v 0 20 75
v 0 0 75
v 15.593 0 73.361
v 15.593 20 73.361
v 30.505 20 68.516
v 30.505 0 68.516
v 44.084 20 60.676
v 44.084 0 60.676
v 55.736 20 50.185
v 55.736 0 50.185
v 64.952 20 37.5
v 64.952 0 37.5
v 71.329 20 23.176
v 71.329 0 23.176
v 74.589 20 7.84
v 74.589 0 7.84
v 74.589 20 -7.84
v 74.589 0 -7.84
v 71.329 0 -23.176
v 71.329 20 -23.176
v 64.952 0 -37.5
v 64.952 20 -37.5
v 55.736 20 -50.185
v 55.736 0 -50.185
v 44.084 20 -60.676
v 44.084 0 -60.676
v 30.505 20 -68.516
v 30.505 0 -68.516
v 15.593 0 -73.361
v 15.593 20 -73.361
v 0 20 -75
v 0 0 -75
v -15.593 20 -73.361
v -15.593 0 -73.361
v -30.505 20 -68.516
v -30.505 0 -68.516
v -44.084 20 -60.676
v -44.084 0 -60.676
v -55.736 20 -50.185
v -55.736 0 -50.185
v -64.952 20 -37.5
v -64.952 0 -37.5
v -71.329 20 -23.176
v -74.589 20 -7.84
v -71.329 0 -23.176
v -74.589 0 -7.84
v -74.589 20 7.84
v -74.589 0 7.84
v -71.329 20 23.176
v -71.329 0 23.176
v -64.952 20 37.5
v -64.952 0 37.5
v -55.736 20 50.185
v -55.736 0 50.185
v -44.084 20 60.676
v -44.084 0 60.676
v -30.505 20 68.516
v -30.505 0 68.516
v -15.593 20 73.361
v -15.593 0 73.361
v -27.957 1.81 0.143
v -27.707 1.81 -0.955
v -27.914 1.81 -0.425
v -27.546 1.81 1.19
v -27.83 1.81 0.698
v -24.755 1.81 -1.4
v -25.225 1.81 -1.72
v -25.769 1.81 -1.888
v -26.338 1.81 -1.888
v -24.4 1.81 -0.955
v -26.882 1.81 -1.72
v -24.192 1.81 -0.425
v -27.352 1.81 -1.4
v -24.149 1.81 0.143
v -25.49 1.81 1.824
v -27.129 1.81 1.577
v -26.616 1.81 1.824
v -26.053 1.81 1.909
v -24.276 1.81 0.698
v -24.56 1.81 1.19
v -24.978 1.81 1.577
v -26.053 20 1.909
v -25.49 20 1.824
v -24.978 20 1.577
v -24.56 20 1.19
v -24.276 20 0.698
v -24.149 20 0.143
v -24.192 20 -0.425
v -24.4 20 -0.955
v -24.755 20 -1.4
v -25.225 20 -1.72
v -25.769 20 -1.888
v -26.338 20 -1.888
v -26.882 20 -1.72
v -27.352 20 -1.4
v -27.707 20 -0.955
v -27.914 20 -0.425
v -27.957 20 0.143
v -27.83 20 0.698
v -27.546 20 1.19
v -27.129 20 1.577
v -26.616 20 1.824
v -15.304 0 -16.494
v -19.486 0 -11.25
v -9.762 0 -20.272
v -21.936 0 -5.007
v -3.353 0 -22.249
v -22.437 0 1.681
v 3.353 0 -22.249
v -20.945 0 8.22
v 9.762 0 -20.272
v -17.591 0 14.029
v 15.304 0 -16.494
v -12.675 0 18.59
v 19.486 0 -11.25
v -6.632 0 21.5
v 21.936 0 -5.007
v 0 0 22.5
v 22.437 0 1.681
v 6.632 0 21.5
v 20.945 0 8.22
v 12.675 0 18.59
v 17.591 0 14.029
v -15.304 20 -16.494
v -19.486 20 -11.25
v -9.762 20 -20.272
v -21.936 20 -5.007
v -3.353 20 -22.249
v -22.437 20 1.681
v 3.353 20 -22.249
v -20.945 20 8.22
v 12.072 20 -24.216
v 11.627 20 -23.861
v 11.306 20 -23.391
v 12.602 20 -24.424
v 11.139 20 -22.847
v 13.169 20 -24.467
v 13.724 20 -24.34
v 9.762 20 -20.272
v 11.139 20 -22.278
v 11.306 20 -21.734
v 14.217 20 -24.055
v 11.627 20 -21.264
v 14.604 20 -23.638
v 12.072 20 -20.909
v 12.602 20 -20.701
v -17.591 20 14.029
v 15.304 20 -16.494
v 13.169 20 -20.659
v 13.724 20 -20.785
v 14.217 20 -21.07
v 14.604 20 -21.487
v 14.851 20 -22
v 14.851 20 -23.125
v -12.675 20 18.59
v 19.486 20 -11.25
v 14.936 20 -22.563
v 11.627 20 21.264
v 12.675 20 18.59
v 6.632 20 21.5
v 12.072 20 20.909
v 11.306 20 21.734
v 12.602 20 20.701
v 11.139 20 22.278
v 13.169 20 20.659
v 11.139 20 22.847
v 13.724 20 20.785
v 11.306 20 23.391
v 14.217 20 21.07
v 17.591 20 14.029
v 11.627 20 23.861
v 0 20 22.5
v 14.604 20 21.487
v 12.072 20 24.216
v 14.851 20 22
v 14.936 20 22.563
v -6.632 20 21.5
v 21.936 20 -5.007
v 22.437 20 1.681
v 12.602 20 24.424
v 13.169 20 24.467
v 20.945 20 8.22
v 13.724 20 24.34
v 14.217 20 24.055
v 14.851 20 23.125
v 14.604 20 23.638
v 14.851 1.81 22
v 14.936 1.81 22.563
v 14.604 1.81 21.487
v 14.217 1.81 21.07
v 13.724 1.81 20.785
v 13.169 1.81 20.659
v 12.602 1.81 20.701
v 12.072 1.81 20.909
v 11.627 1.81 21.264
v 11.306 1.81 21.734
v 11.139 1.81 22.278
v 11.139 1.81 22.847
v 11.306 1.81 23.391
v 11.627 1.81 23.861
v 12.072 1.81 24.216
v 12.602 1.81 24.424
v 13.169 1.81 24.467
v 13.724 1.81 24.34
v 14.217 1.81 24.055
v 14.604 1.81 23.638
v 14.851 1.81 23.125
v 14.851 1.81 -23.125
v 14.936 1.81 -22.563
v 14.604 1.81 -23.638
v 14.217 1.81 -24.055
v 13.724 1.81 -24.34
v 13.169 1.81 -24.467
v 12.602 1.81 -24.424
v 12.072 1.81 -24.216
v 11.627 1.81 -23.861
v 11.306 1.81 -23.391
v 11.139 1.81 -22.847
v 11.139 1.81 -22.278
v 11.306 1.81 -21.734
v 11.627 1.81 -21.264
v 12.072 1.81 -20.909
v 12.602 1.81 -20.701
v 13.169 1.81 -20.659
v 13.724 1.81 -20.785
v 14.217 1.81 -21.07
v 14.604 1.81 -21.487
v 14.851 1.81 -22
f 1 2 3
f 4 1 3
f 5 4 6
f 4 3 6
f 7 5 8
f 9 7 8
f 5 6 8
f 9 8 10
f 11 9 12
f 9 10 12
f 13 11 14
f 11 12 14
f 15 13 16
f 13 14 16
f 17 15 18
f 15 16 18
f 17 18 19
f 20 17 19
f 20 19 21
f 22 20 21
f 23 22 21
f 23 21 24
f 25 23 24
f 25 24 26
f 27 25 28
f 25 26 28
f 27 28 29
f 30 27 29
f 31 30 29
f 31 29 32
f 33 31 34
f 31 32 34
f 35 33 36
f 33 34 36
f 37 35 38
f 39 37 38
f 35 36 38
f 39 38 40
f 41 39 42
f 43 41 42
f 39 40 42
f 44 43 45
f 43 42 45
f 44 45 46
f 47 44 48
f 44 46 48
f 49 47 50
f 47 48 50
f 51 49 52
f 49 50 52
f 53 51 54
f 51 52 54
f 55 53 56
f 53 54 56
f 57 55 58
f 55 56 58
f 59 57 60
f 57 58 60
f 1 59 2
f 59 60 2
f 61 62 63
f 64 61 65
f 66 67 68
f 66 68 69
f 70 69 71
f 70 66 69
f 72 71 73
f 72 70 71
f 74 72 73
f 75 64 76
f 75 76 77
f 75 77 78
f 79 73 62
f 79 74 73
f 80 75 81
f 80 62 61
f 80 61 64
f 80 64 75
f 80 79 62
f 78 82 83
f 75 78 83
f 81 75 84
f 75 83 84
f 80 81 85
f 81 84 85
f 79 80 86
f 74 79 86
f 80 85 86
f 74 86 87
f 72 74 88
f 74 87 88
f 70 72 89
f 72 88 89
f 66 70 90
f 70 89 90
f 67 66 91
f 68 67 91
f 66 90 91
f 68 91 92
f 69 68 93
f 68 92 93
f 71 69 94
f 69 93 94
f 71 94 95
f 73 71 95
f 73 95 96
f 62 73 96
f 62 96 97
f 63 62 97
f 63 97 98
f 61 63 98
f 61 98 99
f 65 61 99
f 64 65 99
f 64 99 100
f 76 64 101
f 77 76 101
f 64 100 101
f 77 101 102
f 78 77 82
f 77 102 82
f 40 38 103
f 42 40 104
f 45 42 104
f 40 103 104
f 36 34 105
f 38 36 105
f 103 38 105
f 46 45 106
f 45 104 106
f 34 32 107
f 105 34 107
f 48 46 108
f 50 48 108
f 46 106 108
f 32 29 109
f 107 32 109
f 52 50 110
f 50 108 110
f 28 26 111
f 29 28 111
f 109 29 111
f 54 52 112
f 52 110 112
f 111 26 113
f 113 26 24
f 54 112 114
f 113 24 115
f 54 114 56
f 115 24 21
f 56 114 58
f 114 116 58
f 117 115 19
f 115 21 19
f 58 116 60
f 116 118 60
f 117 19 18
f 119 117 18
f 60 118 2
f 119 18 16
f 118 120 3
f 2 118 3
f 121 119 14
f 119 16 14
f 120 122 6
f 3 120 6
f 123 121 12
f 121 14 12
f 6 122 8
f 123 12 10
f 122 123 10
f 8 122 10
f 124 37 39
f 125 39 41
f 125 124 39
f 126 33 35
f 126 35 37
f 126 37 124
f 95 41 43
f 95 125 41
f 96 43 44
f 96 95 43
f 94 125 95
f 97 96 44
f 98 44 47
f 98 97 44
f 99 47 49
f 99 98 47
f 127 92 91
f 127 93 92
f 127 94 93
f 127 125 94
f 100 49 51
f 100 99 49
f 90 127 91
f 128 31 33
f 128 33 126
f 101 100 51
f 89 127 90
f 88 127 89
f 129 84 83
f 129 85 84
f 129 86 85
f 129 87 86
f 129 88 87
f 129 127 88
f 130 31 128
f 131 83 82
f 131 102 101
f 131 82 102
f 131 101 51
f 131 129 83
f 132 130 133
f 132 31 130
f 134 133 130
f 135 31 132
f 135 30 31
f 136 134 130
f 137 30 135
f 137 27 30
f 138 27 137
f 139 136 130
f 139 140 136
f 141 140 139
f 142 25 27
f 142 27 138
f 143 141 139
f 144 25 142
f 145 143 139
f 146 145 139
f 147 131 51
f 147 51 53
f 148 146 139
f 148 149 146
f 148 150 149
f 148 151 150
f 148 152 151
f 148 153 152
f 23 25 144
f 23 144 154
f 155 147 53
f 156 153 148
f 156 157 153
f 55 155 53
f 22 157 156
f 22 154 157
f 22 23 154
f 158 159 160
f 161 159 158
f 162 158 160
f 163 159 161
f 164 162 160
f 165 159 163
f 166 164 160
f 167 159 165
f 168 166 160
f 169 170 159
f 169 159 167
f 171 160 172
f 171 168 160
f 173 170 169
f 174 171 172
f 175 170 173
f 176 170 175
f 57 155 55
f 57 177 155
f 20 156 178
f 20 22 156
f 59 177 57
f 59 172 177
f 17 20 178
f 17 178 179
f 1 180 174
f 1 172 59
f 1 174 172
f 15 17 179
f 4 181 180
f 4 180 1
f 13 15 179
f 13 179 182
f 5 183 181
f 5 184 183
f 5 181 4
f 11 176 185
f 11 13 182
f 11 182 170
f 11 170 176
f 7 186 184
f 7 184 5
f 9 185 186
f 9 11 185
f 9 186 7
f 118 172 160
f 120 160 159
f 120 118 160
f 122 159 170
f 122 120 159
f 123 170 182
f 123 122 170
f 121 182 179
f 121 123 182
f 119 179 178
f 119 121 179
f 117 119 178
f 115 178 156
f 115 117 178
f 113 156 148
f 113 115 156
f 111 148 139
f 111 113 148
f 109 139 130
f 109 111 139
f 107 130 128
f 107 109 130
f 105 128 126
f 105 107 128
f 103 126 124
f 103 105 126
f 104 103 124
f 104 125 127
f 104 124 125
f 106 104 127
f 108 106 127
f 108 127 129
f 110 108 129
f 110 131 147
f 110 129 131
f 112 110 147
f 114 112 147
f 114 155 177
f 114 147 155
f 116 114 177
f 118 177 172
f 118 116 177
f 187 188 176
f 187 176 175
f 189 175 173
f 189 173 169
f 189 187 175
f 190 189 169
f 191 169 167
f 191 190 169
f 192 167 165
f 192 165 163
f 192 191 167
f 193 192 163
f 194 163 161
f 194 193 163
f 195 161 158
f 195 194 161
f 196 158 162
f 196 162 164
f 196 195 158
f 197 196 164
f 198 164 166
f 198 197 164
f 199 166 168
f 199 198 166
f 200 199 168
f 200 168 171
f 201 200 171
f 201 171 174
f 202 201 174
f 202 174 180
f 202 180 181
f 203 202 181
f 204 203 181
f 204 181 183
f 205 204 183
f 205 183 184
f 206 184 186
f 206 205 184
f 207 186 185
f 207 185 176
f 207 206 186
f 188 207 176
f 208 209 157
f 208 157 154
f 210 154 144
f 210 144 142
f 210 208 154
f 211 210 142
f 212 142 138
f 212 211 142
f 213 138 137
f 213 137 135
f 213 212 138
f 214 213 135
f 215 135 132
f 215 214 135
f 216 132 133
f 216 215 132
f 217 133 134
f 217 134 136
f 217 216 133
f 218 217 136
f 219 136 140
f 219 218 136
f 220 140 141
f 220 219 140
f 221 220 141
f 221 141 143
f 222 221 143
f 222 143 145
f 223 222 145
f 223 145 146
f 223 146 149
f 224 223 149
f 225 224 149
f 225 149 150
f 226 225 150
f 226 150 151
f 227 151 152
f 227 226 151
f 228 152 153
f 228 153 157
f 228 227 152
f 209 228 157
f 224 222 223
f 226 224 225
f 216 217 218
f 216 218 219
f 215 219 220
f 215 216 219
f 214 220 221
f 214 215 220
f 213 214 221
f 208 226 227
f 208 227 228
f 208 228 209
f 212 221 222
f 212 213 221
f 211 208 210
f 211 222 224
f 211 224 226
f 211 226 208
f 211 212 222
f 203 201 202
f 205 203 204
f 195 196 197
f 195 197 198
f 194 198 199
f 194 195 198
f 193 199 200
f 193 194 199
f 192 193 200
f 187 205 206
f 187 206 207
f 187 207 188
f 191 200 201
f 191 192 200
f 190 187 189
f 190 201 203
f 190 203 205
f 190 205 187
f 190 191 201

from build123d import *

# Parameters (mm, degrees)
SKETCH1_R           = 75
BOSS_EXTRUDE1_DEPTH = 20
SKETCH2_R           = 22.5
CUT_EXTRUDE1_DEPTH  = 108.935165725
SKETCH3_R           = 1.909197161
CUT_EXTRUDE2_DEPTH  = 18.190324685
CIRPATTERN1_COUNT   = 3


with BuildPart() as part:
    # Sketch1 → Boss-Extrude1 (new body)
    with BuildSketch(Plane(origin=(0, 0, 0), x_dir=(1, 0, 0), z_dir=(0, 1, 0))):
        Circle(SKETCH1_R)
    extrude(amount=BOSS_EXTRUDE1_DEPTH)

    # Sketch2 → Cut-Extrude1 (cut, through all)
    with BuildSketch(Plane(origin=(0, 0, 0), x_dir=(1, 0, 0), z_dir=(0, 1, 0))):
        Circle(SKETCH2_R)
    extrude(amount=CUT_EXTRUDE1_DEPTH, mode=Mode.SUBTRACT)

    # Sketch3 → Cut-Extrude2 (cut)
    with BuildSketch(Plane(origin=(0, 20, 0), x_dir=(1, 0, 0), z_dir=(0, 1, 0))):
        with Locations((-26.053157287, 0)):
            Circle(SKETCH3_R)
    cut_extrude2 = extrude(amount=-CUT_EXTRUDE2_DEPTH, mode=Mode.SUBTRACT)

    # CirPattern1: Cut-Extrude2 ×3 about axis
    cirpattern1_axis = Axis((0, 0, 0), (0, 1, 0))
    for i in range(1, CIRPATTERN1_COUNT):
        add(cut_extrude2.rotate(cirpattern1_axis, i * 360 / CIRPATTERN1_COUNT), mode=Mode.SUBTRACT)


solid = part.part
